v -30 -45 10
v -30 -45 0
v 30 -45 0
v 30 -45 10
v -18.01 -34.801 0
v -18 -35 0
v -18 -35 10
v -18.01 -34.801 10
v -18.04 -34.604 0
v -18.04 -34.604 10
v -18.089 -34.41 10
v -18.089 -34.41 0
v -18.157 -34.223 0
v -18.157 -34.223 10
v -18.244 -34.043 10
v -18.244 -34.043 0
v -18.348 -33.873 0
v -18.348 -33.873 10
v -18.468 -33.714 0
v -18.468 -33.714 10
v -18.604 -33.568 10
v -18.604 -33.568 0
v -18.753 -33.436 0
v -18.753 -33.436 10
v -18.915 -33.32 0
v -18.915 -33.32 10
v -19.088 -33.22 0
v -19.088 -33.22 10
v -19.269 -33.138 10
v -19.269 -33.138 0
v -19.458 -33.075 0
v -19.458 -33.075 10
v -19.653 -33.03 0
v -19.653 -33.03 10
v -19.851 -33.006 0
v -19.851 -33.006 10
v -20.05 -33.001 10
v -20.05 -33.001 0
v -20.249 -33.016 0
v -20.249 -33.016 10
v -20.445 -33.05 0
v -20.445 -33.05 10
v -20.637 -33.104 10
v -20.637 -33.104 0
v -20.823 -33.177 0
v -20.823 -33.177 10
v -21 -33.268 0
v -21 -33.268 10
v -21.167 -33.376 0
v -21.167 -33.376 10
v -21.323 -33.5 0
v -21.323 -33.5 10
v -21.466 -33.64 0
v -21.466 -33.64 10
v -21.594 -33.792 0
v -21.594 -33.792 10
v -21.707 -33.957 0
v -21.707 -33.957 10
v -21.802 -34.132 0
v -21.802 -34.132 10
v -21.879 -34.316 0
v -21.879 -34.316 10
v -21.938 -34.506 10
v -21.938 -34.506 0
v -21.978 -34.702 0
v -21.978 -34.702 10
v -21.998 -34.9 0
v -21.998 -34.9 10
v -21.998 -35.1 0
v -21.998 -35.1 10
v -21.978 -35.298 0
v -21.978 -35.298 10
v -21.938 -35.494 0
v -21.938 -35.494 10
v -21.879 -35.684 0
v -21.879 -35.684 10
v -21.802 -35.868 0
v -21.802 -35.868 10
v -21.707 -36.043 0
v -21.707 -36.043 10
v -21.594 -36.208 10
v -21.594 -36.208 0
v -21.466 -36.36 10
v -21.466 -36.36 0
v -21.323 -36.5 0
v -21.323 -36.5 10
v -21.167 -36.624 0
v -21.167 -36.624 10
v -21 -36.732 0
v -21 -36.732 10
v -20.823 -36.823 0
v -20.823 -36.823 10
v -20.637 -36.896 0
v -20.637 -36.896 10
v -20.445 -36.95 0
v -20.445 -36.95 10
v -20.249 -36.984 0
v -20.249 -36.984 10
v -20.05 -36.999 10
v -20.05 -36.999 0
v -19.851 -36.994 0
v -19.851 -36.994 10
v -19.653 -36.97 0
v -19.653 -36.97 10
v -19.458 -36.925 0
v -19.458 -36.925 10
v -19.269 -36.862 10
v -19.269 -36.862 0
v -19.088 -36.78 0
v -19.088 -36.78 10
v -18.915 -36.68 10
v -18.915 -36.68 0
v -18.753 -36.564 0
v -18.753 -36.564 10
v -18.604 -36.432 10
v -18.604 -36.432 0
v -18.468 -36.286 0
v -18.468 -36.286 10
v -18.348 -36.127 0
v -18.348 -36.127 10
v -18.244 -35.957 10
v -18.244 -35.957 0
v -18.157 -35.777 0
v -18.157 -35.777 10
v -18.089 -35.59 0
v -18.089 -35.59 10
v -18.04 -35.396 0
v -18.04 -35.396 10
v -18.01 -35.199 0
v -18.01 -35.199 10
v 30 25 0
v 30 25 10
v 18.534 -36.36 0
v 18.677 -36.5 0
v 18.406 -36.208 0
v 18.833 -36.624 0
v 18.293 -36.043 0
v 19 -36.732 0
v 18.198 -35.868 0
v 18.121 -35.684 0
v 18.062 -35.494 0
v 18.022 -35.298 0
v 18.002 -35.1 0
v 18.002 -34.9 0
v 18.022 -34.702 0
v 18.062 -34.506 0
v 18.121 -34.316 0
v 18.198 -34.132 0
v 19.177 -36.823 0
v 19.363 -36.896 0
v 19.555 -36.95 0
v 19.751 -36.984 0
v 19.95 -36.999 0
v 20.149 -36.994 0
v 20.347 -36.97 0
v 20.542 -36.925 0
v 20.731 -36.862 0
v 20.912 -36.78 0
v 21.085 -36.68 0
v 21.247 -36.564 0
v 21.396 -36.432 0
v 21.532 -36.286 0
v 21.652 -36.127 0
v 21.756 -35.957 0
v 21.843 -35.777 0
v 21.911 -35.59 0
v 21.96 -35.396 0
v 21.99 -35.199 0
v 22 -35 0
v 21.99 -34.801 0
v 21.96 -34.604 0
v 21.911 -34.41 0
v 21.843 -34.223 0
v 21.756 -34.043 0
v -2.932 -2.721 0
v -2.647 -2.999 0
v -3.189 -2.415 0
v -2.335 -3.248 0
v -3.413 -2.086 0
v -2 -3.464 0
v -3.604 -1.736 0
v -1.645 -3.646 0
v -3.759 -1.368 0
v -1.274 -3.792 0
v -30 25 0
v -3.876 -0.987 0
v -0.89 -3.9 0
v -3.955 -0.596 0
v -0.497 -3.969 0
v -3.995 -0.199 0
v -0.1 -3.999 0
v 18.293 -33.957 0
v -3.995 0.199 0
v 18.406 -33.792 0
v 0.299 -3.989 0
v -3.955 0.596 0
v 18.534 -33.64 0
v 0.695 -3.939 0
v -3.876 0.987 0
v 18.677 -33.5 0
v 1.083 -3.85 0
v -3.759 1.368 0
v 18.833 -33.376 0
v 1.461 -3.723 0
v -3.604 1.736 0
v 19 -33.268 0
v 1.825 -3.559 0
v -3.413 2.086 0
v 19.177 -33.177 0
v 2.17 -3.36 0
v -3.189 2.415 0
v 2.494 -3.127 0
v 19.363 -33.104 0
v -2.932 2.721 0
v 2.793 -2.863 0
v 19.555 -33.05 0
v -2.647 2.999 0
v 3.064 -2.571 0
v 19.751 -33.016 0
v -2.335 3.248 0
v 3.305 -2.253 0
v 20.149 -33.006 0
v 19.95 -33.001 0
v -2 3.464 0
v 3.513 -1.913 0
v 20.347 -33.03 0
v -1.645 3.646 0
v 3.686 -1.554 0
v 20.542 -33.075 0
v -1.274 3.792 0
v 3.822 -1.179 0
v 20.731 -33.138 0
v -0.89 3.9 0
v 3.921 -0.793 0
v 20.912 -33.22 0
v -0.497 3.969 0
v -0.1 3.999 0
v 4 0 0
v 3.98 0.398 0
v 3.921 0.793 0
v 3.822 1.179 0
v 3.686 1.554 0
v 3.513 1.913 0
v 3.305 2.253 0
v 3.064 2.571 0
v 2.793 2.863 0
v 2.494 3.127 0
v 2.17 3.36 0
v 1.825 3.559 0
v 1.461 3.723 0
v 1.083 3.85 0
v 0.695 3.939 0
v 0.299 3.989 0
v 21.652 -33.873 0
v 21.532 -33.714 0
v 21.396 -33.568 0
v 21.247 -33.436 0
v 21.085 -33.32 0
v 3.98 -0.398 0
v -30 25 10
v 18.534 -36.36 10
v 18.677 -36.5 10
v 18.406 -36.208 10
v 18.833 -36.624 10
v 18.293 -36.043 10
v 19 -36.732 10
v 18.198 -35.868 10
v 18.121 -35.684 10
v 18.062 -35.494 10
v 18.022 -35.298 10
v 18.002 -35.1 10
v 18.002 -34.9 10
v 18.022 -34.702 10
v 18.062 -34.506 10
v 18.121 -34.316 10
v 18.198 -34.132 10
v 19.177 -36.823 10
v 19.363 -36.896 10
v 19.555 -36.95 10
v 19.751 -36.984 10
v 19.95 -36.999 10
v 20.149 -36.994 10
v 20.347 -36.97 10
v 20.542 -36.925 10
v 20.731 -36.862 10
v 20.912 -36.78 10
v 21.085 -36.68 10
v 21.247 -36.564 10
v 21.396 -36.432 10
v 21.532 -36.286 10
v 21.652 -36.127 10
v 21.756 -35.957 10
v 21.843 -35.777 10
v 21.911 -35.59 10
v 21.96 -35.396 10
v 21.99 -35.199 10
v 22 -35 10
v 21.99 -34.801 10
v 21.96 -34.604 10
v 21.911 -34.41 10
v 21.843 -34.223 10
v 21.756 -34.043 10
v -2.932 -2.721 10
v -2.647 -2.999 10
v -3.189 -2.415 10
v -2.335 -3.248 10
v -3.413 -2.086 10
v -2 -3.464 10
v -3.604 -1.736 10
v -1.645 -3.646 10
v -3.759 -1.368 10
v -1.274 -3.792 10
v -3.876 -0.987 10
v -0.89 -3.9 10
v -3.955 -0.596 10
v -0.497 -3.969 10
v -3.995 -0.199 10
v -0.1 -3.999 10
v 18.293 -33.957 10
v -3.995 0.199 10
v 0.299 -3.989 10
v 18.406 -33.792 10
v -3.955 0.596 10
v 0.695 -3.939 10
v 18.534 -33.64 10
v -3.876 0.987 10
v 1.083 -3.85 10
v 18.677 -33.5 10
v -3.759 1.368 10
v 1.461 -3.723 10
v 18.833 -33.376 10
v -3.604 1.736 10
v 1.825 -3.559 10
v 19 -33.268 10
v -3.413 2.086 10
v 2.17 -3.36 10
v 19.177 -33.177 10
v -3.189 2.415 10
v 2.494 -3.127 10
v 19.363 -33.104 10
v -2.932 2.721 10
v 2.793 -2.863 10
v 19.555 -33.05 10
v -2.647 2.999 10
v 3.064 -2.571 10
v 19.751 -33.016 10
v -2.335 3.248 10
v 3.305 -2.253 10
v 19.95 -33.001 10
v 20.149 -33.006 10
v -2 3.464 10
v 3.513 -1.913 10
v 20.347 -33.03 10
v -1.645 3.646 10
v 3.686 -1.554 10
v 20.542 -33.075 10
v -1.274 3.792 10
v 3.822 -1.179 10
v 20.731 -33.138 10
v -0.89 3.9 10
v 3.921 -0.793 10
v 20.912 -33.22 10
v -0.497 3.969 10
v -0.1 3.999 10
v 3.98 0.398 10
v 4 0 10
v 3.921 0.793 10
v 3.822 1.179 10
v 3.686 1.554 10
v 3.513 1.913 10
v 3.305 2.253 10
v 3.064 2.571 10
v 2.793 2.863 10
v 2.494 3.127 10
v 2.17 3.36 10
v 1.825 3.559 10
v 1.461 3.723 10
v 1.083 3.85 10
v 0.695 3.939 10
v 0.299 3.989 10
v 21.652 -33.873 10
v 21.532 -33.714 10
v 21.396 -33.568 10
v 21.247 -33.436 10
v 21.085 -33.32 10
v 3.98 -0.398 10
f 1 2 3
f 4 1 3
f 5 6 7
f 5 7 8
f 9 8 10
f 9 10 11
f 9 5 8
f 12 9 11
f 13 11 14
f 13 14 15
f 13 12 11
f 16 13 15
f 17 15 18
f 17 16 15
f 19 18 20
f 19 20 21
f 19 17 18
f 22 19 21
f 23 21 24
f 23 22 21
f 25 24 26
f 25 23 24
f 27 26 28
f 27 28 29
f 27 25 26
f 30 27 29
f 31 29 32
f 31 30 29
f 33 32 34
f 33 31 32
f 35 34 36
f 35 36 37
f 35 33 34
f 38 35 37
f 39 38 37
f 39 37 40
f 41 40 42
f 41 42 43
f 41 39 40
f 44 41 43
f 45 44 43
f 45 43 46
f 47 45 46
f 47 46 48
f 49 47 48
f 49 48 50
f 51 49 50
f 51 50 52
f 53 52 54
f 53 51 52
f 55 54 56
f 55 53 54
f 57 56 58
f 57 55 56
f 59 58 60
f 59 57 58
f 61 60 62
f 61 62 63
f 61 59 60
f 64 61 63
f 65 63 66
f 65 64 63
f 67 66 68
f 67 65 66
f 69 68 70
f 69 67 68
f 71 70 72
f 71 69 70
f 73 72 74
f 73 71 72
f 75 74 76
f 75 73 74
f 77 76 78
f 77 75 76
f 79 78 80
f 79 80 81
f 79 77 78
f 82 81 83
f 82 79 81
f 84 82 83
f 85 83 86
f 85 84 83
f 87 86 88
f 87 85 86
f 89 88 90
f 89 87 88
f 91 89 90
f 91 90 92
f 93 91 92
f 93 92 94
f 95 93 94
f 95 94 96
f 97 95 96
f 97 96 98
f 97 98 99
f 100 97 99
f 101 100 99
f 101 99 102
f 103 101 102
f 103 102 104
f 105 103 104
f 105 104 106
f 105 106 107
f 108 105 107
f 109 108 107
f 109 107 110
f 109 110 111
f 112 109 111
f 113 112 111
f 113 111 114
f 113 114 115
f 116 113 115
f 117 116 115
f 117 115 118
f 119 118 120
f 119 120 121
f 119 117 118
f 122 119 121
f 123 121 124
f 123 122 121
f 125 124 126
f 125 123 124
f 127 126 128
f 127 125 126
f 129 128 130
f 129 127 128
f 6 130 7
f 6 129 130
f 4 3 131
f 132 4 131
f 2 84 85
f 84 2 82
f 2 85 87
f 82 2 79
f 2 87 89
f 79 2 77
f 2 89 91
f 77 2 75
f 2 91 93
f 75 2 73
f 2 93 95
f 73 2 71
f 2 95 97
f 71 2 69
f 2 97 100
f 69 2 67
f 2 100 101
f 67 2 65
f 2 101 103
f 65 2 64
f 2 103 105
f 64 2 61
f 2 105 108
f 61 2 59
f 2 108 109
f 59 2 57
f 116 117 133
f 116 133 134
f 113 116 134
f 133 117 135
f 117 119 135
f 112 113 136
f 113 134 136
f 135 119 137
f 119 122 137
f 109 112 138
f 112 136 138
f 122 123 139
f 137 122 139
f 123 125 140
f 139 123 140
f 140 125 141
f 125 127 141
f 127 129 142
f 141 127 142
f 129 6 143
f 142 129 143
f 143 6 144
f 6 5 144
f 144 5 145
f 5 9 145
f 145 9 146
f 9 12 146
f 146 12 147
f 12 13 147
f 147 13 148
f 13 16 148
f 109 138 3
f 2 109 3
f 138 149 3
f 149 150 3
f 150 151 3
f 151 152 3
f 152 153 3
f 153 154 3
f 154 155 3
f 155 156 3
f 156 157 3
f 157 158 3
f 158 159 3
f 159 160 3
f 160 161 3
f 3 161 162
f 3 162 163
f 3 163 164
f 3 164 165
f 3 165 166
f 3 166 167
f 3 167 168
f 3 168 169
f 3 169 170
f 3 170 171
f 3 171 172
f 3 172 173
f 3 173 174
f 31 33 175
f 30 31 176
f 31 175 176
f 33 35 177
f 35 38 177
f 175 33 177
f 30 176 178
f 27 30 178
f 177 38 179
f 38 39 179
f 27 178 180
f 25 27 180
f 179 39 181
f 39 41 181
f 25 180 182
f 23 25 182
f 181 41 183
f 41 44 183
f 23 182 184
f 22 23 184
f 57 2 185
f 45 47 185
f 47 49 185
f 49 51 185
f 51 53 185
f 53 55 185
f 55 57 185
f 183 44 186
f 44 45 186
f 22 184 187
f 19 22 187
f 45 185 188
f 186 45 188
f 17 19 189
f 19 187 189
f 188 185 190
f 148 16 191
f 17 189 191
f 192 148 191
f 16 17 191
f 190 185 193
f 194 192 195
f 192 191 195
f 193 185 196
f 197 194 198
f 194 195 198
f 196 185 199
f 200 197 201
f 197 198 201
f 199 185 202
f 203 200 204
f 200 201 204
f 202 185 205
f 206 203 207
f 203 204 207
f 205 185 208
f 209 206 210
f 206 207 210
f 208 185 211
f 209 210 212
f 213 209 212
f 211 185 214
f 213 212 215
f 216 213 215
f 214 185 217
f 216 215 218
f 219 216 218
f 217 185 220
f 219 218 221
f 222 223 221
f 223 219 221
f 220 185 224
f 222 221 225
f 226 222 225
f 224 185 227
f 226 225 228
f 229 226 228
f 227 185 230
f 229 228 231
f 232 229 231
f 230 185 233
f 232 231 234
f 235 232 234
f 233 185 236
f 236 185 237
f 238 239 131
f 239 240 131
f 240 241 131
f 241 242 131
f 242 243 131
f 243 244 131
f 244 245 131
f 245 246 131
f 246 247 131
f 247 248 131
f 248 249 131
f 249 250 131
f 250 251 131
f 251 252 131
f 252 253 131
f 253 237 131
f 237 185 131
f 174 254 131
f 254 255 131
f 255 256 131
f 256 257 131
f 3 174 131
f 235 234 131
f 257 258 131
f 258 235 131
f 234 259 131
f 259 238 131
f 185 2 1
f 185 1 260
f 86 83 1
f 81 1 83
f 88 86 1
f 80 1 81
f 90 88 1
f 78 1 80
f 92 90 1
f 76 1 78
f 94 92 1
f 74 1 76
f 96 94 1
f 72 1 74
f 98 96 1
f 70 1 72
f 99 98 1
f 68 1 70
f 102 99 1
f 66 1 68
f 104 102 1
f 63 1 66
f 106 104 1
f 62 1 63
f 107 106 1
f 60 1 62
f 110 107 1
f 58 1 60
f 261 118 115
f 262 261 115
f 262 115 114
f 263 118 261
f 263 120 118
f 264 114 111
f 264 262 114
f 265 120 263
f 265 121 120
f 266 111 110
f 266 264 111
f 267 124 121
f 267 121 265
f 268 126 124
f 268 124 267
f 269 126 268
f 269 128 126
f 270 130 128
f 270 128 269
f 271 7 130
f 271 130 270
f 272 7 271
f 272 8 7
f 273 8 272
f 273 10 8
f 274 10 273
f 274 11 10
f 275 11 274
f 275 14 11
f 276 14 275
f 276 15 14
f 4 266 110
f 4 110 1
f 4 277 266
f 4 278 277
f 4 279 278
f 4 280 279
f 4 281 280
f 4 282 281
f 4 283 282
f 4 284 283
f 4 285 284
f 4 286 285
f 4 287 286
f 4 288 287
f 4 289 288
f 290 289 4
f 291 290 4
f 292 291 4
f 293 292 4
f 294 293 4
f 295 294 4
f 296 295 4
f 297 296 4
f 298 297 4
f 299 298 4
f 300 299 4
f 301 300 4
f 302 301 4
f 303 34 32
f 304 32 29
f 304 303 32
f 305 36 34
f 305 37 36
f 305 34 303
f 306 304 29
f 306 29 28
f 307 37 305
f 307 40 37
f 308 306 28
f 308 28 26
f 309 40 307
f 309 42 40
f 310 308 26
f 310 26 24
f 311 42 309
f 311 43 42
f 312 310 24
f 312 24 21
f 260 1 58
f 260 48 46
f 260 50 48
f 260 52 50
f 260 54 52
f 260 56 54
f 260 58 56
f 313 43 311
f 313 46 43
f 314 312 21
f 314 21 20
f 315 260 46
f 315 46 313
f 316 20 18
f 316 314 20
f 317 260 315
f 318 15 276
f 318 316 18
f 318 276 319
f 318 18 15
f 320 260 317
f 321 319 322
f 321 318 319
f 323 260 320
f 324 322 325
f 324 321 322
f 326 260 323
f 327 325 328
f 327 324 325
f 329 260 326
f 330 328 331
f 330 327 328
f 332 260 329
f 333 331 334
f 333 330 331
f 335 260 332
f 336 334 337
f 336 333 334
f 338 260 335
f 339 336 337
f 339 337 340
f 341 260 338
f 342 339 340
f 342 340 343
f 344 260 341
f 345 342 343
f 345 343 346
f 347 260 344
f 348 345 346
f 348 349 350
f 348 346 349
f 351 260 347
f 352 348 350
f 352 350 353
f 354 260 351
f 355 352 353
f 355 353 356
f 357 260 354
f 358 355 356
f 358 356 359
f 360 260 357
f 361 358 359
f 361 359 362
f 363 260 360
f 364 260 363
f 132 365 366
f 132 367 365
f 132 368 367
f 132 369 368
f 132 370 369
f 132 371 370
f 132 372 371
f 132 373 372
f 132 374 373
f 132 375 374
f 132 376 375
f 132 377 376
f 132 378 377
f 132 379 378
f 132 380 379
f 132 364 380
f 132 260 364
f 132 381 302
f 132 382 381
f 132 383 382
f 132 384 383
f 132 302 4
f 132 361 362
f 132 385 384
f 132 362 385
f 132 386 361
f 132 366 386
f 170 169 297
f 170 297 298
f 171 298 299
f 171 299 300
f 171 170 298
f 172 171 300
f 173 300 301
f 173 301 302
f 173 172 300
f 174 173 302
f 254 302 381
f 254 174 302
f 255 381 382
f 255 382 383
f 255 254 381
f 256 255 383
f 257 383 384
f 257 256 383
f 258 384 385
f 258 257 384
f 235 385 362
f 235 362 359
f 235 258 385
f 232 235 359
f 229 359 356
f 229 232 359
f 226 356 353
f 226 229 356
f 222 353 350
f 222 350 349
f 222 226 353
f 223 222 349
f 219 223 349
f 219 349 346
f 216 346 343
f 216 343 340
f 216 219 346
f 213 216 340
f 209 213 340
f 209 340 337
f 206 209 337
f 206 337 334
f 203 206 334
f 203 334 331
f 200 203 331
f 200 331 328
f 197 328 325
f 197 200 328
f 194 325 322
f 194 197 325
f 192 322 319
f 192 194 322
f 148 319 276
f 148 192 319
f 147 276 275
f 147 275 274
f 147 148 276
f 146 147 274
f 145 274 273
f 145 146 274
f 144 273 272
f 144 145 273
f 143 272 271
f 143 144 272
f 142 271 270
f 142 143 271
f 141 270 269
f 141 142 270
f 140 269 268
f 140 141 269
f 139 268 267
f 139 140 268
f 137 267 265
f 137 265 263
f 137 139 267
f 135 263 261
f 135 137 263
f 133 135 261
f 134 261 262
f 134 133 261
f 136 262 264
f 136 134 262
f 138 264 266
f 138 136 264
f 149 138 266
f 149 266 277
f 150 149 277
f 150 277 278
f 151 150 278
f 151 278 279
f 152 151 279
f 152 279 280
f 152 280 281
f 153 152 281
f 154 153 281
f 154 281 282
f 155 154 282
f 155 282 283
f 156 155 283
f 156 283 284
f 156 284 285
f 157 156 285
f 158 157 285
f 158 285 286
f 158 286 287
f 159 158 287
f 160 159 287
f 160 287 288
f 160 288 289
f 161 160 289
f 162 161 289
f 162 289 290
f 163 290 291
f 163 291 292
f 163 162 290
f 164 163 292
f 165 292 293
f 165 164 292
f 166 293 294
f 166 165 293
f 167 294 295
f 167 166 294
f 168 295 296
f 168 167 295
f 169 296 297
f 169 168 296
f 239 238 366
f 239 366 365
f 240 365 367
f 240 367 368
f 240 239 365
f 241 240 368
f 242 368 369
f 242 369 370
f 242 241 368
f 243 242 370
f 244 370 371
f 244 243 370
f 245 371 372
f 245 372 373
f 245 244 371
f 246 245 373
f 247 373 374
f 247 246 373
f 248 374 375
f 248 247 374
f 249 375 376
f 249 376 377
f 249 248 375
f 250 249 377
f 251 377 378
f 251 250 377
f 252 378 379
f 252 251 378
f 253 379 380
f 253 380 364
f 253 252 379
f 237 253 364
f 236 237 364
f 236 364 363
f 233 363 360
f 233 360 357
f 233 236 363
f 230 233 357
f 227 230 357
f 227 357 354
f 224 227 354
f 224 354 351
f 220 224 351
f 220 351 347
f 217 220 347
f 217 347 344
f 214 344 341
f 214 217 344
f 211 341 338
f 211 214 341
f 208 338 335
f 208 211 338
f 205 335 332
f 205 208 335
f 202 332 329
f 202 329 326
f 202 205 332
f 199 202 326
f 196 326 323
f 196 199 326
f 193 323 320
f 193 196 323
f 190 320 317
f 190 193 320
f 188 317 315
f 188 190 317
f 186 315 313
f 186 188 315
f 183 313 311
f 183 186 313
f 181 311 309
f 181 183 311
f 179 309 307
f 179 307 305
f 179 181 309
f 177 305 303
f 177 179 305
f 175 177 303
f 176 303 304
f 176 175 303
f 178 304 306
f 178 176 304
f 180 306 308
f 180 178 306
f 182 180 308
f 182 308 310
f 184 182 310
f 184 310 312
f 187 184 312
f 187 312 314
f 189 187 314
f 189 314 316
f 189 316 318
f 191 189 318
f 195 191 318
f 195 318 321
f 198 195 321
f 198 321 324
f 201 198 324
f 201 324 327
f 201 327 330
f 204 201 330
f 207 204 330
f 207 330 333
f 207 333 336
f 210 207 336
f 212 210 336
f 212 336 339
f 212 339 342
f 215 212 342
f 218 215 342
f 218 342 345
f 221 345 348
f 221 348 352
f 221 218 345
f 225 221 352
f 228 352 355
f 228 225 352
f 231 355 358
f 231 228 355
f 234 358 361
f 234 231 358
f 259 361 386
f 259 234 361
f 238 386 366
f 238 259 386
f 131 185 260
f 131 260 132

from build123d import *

# Parameters (mm, degrees)
SKETCH1_W           = 60
SKETCH1_H           = 70
SKETCH1_R           = 11
SKETCH1_R_2         = 2
SKETCH1_R_3         = 4
BOSS_EXTRUDE1_DEPTH = 10


with BuildPart() as part:
    # Sketch1 → Boss-Extrude1 (new body)
    # profile 1 of 2: a face of its own
    with BuildSketch(Plane.XY):
        with Locations((0, -10)):
            Rectangle(SKETCH1_W, SKETCH1_H)
        Circle(SKETCH1_R, mode=Mode.SUBTRACT)
        with Locations((20, -35)):
            Circle(SKETCH1_R_2, mode=Mode.SUBTRACT)
        with Locations((-20, -35)):
            Circle(SKETCH1_R_2, mode=Mode.SUBTRACT)
    # profile 2 of 2: a face of its own
    with BuildSketch(Plane.XY):
        Circle(SKETCH1_R)
        Circle(SKETCH1_R_3, mode=Mode.SUBTRACT)
    extrude(amount=BOSS_EXTRUDE1_DEPTH)


solid = part.part
